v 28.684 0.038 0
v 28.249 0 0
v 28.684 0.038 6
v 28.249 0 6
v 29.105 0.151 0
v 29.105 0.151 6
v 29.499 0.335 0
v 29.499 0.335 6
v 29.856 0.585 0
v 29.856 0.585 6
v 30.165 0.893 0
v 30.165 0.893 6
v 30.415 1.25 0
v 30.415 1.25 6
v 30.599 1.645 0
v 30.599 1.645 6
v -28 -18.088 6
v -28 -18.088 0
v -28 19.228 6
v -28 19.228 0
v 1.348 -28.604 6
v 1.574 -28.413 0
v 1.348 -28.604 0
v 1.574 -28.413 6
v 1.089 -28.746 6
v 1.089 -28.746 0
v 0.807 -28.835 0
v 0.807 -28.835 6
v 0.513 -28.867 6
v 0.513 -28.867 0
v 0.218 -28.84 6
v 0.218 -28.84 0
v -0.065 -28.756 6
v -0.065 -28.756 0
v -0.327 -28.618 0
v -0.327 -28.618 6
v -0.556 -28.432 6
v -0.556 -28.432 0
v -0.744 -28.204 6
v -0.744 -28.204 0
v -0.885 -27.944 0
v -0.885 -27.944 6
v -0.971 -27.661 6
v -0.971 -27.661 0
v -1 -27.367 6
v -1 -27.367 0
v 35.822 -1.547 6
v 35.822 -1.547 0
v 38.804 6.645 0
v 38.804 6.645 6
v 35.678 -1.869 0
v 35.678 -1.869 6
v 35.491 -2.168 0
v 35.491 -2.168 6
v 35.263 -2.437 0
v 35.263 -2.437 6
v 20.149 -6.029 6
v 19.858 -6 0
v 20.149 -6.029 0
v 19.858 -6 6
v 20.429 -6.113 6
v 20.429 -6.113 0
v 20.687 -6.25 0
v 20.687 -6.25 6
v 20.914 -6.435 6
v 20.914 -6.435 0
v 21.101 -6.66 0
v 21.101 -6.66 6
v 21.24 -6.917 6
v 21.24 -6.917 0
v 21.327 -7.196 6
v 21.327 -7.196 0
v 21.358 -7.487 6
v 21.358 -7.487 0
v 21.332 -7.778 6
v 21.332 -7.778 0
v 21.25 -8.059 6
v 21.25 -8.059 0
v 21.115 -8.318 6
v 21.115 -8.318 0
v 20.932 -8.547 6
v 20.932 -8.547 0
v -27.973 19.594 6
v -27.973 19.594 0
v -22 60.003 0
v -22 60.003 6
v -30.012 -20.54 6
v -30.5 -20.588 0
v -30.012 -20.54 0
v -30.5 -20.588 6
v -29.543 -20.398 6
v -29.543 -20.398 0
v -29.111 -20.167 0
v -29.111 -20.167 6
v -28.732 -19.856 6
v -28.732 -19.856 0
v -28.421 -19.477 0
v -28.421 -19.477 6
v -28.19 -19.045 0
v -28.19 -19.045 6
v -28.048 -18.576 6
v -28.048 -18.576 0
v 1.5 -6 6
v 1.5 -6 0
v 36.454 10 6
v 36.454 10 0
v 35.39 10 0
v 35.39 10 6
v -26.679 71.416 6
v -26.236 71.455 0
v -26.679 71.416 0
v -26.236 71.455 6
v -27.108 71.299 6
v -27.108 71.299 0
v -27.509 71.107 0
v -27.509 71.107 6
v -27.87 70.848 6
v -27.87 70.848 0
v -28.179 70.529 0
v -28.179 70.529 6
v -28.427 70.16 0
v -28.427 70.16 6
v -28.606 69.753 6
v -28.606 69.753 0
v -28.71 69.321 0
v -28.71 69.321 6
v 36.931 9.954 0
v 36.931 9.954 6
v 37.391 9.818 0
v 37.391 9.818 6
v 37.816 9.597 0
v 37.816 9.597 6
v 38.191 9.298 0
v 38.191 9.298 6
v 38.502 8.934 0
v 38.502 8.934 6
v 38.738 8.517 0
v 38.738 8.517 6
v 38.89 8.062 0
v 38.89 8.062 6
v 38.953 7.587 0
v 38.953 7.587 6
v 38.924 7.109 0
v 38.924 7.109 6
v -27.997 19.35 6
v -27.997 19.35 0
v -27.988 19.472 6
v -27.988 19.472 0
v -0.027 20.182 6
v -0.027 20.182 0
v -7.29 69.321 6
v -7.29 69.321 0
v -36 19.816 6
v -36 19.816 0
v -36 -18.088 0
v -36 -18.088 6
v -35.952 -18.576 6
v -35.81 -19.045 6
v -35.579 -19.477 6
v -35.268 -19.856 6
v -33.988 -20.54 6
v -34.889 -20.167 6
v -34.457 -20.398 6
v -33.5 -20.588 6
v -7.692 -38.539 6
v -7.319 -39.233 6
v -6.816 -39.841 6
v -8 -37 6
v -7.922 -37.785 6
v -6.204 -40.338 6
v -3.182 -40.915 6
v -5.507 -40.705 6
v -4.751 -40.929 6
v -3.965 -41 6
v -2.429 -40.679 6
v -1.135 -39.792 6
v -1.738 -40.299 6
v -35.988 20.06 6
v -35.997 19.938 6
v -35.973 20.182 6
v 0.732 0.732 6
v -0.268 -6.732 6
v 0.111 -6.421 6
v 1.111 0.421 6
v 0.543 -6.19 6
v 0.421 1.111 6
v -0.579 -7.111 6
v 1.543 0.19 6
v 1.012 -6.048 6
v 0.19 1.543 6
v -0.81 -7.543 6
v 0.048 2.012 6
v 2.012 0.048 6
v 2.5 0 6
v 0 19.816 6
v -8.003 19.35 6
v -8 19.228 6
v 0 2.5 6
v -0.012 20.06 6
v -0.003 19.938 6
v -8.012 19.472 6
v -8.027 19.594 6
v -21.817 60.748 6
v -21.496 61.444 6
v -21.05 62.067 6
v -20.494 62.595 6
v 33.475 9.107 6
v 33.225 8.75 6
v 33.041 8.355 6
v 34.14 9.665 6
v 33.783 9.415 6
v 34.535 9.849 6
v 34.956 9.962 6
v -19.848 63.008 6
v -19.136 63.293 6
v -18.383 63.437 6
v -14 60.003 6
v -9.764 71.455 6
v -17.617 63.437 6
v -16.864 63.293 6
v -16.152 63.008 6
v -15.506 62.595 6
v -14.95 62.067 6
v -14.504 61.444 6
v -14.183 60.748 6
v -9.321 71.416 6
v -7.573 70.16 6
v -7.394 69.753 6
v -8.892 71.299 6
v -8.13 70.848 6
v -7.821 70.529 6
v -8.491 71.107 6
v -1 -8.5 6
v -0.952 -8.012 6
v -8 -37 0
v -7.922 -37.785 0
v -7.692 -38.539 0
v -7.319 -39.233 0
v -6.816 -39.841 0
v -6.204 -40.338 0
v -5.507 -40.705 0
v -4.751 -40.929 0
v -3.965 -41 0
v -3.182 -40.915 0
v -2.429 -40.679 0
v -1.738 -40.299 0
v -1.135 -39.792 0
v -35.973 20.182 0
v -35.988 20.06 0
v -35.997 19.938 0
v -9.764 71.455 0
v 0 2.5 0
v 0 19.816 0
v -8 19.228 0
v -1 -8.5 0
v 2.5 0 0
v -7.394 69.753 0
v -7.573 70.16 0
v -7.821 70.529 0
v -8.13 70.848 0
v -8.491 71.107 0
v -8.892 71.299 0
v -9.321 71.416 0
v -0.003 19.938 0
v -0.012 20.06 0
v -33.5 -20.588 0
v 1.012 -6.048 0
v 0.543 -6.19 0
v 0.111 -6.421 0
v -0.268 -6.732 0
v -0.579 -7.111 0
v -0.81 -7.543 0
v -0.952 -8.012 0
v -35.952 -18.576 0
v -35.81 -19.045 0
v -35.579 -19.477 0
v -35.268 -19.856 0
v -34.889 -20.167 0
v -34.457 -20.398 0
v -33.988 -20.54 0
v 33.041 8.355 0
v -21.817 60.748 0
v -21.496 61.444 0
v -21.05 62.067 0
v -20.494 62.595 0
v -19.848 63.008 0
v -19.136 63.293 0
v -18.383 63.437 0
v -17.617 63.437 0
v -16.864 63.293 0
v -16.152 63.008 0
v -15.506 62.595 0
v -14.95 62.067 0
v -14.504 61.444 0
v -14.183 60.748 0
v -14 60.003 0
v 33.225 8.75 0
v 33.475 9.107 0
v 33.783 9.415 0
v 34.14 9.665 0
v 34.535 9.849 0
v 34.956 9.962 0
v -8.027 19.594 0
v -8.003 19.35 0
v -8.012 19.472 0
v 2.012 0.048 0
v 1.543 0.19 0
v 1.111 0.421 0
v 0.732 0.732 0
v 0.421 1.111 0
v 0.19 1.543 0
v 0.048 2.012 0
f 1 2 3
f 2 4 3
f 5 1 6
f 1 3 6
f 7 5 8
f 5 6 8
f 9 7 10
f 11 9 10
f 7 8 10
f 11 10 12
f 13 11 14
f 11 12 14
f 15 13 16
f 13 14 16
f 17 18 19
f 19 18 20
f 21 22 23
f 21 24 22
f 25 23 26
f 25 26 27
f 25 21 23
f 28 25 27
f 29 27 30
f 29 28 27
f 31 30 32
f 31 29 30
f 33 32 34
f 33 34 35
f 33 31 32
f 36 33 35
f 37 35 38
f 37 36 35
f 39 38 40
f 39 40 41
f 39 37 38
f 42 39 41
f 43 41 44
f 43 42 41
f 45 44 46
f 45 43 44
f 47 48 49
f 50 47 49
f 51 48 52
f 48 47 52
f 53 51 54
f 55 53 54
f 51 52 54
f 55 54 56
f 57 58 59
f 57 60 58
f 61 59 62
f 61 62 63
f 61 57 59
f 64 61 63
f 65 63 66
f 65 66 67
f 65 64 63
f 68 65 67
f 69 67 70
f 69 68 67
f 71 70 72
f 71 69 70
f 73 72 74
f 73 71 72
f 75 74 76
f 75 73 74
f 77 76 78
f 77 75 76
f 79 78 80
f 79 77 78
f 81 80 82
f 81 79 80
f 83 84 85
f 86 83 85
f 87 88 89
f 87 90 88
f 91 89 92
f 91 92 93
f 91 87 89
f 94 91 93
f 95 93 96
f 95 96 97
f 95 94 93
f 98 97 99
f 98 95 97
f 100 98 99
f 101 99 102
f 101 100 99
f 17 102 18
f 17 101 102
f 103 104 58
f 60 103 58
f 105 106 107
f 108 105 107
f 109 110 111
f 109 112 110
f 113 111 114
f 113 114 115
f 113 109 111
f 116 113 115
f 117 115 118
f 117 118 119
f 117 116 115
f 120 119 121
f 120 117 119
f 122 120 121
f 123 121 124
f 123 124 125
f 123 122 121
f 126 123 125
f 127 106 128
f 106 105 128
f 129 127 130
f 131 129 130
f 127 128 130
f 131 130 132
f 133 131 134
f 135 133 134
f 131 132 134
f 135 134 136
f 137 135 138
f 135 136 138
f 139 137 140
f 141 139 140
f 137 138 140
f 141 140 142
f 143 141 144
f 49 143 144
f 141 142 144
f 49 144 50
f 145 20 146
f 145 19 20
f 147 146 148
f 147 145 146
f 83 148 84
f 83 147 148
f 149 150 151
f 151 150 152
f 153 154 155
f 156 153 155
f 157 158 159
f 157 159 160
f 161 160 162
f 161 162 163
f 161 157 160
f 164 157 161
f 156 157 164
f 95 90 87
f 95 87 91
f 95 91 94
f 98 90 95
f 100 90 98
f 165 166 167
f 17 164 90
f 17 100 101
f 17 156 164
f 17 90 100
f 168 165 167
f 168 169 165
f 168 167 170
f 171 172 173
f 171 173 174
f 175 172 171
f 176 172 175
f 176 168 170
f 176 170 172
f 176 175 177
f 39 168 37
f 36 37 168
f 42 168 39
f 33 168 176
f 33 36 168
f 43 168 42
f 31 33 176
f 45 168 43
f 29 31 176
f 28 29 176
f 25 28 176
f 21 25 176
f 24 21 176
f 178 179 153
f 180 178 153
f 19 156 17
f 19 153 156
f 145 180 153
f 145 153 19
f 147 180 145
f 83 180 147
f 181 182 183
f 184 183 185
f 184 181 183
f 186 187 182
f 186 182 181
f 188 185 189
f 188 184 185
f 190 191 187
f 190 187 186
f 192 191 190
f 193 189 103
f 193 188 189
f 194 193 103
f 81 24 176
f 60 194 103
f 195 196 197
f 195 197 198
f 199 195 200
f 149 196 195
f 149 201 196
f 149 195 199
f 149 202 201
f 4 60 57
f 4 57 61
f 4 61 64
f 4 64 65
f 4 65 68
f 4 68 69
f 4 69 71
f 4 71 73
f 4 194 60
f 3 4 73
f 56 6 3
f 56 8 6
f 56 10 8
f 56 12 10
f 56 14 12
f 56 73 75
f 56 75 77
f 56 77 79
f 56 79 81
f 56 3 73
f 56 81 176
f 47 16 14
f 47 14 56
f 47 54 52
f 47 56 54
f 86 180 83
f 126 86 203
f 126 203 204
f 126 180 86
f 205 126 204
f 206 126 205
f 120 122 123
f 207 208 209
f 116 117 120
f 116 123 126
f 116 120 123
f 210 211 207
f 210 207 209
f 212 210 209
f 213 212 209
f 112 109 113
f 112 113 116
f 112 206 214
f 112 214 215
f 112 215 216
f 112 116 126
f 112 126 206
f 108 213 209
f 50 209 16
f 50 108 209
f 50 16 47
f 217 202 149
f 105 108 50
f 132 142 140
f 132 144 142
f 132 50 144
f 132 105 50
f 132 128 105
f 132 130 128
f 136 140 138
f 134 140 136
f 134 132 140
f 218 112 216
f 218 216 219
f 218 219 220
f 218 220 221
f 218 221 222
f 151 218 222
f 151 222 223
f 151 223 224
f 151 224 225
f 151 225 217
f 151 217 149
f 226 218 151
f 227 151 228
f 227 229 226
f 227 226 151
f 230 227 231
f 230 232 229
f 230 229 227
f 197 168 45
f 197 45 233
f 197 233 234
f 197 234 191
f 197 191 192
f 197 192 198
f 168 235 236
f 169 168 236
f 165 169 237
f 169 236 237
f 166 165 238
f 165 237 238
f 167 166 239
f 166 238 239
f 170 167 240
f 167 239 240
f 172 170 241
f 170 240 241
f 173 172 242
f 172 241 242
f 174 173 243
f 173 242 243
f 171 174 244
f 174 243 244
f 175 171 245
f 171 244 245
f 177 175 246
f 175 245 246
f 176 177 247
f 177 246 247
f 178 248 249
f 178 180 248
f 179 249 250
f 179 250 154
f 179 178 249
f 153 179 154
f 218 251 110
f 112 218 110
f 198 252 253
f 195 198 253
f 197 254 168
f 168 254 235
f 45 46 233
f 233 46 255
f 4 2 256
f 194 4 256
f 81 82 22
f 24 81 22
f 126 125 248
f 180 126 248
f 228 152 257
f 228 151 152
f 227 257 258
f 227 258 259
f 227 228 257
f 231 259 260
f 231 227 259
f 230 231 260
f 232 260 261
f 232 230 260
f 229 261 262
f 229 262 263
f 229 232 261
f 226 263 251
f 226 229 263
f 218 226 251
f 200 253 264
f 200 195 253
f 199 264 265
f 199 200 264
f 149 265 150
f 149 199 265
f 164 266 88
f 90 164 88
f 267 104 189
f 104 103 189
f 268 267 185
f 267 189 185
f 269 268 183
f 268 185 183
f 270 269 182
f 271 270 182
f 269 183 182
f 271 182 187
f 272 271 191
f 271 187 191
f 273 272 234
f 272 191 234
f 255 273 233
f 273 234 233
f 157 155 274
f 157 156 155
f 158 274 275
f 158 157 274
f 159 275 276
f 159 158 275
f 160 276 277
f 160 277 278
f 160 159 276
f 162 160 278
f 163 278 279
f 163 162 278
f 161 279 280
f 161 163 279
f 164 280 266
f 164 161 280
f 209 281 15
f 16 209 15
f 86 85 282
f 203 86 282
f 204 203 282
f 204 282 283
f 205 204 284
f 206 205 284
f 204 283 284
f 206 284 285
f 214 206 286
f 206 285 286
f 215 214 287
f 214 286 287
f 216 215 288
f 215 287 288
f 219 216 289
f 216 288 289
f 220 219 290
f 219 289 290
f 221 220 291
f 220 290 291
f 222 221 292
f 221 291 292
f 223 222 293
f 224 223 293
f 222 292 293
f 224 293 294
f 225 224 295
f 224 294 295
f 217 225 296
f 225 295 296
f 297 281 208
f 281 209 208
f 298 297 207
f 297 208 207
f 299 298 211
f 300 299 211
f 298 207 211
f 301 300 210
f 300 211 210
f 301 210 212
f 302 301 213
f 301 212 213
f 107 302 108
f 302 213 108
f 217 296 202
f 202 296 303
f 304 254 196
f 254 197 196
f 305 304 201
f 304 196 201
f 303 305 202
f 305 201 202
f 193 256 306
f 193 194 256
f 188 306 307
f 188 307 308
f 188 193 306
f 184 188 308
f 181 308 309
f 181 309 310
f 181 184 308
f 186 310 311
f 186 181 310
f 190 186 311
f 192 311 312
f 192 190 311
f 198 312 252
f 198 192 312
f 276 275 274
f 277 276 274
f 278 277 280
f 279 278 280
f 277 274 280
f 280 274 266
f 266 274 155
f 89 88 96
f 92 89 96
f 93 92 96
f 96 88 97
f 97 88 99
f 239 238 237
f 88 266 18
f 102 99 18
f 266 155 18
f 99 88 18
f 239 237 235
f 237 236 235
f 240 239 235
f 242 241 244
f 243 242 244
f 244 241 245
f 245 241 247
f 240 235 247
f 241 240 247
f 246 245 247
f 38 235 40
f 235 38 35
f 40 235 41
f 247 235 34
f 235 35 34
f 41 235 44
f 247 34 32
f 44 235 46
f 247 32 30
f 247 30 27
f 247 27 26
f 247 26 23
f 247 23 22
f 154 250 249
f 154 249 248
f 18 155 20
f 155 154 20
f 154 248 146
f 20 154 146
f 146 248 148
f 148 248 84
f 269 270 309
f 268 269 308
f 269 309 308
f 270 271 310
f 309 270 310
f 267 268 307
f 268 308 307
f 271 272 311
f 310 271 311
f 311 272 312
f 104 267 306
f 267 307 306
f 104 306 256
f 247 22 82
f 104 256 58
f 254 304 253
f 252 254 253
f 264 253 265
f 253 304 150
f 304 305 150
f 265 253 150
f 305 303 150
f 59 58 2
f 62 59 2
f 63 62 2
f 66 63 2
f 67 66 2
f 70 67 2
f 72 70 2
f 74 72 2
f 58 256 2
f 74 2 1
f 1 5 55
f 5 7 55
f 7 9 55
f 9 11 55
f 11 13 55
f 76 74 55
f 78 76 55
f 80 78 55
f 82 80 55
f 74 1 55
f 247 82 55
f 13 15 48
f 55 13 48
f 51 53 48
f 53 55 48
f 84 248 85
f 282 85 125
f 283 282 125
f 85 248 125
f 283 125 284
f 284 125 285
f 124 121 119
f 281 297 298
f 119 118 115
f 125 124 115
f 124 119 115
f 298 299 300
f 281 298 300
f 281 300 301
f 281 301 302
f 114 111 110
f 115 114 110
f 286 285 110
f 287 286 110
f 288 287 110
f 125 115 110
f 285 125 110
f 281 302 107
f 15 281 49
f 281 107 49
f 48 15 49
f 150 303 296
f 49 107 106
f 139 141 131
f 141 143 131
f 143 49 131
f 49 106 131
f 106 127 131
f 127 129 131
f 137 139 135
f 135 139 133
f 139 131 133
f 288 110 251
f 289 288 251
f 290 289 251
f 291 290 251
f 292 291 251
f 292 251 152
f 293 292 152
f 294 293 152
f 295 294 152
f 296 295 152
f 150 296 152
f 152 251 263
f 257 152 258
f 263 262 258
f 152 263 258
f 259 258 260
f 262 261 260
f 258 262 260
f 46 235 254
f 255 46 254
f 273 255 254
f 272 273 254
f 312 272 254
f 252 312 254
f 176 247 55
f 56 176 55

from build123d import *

# Parameters (mm, degrees)
F1_DEPTH = 6
F2_R     = 2.5
F3_R     = 1.5


with BuildPart() as f1:
    # F0 (on Top) → F1 (new body)
    with BuildSketch(Plane.XY):
        with BuildLine():
            Line((30, 0), (0, 0))
            Line((0, 0), (0, 20))
            Line((0, 20), (-7.605883, 71.455397))
            Line((-7.605883, 71.455397), (-28.394117, 71.455397))
            Line((-28.394117, 71.455397), (-36, 20))
            Line((-36, 20), (-36, -20.588065))
            Line((-36, -20.588065), (-28, -20.588065))
            Line((-28, -20.588065), (-28, 19.411935))
            Line((-28, 19.411935), (-22, 60.003195))
            ThreePointArc((-22, 60.003195), (-18, 63.455397), (-14, 60.003195))
            Line((-14, 60.003195), (-8, 19.411935))
            Line((-8, 19.411935), (-8, -37))
            ThreePointArc((-8, -37), (-5.506746, -40.705363), (-1.135141, -39.79152))
            Line((-1.135141, -39.79152), (35.638156, -2.052121))
            Line((35.638156, -2.052121), (40.024769, 10))
            Line((40.024769, 10), (33.639702, 10))
            Line((33.639702, 10), (30, 0))
        make_face()
        Polygon((-1, -31.055363), (-1, -6), (23.413963, -6), align=None, mode=Mode.SUBTRACT)
    extrude(amount=F1_DEPTH)

    # F2
    f2_edges = [f1.edges().sort_by_distance(p)[0] for p in [
        (-36, 20, 3),
        (-28.394117, 71.455397, 3),
        (-7.605883, 71.455397, 3),
        (33.639702, 10, 3),
        (40.024769, 10, 3),
        (-8, 19.411935, 3),
        (0, 20, 3),
        (0, 0, 3),
        (30, 0, 3),
        (35.638156, -2.052121, 3),
        (-1, -6, 3),
        (-36, -20.588065, 3),
        (-28, -20.588065, 3),
        (-28, 19.411935, 3),
    ]]
    fillet(f2_edges, radius=F2_R)

    # F3
    f3_edges = [f1.edges().sort_by_distance(p)[0] for p in [
        (23.413963, -6, 3),
        (-1, -31.055363, 3),
    ]]
    fillet(f3_edges, radius=F3_R)


solid = f1.part
